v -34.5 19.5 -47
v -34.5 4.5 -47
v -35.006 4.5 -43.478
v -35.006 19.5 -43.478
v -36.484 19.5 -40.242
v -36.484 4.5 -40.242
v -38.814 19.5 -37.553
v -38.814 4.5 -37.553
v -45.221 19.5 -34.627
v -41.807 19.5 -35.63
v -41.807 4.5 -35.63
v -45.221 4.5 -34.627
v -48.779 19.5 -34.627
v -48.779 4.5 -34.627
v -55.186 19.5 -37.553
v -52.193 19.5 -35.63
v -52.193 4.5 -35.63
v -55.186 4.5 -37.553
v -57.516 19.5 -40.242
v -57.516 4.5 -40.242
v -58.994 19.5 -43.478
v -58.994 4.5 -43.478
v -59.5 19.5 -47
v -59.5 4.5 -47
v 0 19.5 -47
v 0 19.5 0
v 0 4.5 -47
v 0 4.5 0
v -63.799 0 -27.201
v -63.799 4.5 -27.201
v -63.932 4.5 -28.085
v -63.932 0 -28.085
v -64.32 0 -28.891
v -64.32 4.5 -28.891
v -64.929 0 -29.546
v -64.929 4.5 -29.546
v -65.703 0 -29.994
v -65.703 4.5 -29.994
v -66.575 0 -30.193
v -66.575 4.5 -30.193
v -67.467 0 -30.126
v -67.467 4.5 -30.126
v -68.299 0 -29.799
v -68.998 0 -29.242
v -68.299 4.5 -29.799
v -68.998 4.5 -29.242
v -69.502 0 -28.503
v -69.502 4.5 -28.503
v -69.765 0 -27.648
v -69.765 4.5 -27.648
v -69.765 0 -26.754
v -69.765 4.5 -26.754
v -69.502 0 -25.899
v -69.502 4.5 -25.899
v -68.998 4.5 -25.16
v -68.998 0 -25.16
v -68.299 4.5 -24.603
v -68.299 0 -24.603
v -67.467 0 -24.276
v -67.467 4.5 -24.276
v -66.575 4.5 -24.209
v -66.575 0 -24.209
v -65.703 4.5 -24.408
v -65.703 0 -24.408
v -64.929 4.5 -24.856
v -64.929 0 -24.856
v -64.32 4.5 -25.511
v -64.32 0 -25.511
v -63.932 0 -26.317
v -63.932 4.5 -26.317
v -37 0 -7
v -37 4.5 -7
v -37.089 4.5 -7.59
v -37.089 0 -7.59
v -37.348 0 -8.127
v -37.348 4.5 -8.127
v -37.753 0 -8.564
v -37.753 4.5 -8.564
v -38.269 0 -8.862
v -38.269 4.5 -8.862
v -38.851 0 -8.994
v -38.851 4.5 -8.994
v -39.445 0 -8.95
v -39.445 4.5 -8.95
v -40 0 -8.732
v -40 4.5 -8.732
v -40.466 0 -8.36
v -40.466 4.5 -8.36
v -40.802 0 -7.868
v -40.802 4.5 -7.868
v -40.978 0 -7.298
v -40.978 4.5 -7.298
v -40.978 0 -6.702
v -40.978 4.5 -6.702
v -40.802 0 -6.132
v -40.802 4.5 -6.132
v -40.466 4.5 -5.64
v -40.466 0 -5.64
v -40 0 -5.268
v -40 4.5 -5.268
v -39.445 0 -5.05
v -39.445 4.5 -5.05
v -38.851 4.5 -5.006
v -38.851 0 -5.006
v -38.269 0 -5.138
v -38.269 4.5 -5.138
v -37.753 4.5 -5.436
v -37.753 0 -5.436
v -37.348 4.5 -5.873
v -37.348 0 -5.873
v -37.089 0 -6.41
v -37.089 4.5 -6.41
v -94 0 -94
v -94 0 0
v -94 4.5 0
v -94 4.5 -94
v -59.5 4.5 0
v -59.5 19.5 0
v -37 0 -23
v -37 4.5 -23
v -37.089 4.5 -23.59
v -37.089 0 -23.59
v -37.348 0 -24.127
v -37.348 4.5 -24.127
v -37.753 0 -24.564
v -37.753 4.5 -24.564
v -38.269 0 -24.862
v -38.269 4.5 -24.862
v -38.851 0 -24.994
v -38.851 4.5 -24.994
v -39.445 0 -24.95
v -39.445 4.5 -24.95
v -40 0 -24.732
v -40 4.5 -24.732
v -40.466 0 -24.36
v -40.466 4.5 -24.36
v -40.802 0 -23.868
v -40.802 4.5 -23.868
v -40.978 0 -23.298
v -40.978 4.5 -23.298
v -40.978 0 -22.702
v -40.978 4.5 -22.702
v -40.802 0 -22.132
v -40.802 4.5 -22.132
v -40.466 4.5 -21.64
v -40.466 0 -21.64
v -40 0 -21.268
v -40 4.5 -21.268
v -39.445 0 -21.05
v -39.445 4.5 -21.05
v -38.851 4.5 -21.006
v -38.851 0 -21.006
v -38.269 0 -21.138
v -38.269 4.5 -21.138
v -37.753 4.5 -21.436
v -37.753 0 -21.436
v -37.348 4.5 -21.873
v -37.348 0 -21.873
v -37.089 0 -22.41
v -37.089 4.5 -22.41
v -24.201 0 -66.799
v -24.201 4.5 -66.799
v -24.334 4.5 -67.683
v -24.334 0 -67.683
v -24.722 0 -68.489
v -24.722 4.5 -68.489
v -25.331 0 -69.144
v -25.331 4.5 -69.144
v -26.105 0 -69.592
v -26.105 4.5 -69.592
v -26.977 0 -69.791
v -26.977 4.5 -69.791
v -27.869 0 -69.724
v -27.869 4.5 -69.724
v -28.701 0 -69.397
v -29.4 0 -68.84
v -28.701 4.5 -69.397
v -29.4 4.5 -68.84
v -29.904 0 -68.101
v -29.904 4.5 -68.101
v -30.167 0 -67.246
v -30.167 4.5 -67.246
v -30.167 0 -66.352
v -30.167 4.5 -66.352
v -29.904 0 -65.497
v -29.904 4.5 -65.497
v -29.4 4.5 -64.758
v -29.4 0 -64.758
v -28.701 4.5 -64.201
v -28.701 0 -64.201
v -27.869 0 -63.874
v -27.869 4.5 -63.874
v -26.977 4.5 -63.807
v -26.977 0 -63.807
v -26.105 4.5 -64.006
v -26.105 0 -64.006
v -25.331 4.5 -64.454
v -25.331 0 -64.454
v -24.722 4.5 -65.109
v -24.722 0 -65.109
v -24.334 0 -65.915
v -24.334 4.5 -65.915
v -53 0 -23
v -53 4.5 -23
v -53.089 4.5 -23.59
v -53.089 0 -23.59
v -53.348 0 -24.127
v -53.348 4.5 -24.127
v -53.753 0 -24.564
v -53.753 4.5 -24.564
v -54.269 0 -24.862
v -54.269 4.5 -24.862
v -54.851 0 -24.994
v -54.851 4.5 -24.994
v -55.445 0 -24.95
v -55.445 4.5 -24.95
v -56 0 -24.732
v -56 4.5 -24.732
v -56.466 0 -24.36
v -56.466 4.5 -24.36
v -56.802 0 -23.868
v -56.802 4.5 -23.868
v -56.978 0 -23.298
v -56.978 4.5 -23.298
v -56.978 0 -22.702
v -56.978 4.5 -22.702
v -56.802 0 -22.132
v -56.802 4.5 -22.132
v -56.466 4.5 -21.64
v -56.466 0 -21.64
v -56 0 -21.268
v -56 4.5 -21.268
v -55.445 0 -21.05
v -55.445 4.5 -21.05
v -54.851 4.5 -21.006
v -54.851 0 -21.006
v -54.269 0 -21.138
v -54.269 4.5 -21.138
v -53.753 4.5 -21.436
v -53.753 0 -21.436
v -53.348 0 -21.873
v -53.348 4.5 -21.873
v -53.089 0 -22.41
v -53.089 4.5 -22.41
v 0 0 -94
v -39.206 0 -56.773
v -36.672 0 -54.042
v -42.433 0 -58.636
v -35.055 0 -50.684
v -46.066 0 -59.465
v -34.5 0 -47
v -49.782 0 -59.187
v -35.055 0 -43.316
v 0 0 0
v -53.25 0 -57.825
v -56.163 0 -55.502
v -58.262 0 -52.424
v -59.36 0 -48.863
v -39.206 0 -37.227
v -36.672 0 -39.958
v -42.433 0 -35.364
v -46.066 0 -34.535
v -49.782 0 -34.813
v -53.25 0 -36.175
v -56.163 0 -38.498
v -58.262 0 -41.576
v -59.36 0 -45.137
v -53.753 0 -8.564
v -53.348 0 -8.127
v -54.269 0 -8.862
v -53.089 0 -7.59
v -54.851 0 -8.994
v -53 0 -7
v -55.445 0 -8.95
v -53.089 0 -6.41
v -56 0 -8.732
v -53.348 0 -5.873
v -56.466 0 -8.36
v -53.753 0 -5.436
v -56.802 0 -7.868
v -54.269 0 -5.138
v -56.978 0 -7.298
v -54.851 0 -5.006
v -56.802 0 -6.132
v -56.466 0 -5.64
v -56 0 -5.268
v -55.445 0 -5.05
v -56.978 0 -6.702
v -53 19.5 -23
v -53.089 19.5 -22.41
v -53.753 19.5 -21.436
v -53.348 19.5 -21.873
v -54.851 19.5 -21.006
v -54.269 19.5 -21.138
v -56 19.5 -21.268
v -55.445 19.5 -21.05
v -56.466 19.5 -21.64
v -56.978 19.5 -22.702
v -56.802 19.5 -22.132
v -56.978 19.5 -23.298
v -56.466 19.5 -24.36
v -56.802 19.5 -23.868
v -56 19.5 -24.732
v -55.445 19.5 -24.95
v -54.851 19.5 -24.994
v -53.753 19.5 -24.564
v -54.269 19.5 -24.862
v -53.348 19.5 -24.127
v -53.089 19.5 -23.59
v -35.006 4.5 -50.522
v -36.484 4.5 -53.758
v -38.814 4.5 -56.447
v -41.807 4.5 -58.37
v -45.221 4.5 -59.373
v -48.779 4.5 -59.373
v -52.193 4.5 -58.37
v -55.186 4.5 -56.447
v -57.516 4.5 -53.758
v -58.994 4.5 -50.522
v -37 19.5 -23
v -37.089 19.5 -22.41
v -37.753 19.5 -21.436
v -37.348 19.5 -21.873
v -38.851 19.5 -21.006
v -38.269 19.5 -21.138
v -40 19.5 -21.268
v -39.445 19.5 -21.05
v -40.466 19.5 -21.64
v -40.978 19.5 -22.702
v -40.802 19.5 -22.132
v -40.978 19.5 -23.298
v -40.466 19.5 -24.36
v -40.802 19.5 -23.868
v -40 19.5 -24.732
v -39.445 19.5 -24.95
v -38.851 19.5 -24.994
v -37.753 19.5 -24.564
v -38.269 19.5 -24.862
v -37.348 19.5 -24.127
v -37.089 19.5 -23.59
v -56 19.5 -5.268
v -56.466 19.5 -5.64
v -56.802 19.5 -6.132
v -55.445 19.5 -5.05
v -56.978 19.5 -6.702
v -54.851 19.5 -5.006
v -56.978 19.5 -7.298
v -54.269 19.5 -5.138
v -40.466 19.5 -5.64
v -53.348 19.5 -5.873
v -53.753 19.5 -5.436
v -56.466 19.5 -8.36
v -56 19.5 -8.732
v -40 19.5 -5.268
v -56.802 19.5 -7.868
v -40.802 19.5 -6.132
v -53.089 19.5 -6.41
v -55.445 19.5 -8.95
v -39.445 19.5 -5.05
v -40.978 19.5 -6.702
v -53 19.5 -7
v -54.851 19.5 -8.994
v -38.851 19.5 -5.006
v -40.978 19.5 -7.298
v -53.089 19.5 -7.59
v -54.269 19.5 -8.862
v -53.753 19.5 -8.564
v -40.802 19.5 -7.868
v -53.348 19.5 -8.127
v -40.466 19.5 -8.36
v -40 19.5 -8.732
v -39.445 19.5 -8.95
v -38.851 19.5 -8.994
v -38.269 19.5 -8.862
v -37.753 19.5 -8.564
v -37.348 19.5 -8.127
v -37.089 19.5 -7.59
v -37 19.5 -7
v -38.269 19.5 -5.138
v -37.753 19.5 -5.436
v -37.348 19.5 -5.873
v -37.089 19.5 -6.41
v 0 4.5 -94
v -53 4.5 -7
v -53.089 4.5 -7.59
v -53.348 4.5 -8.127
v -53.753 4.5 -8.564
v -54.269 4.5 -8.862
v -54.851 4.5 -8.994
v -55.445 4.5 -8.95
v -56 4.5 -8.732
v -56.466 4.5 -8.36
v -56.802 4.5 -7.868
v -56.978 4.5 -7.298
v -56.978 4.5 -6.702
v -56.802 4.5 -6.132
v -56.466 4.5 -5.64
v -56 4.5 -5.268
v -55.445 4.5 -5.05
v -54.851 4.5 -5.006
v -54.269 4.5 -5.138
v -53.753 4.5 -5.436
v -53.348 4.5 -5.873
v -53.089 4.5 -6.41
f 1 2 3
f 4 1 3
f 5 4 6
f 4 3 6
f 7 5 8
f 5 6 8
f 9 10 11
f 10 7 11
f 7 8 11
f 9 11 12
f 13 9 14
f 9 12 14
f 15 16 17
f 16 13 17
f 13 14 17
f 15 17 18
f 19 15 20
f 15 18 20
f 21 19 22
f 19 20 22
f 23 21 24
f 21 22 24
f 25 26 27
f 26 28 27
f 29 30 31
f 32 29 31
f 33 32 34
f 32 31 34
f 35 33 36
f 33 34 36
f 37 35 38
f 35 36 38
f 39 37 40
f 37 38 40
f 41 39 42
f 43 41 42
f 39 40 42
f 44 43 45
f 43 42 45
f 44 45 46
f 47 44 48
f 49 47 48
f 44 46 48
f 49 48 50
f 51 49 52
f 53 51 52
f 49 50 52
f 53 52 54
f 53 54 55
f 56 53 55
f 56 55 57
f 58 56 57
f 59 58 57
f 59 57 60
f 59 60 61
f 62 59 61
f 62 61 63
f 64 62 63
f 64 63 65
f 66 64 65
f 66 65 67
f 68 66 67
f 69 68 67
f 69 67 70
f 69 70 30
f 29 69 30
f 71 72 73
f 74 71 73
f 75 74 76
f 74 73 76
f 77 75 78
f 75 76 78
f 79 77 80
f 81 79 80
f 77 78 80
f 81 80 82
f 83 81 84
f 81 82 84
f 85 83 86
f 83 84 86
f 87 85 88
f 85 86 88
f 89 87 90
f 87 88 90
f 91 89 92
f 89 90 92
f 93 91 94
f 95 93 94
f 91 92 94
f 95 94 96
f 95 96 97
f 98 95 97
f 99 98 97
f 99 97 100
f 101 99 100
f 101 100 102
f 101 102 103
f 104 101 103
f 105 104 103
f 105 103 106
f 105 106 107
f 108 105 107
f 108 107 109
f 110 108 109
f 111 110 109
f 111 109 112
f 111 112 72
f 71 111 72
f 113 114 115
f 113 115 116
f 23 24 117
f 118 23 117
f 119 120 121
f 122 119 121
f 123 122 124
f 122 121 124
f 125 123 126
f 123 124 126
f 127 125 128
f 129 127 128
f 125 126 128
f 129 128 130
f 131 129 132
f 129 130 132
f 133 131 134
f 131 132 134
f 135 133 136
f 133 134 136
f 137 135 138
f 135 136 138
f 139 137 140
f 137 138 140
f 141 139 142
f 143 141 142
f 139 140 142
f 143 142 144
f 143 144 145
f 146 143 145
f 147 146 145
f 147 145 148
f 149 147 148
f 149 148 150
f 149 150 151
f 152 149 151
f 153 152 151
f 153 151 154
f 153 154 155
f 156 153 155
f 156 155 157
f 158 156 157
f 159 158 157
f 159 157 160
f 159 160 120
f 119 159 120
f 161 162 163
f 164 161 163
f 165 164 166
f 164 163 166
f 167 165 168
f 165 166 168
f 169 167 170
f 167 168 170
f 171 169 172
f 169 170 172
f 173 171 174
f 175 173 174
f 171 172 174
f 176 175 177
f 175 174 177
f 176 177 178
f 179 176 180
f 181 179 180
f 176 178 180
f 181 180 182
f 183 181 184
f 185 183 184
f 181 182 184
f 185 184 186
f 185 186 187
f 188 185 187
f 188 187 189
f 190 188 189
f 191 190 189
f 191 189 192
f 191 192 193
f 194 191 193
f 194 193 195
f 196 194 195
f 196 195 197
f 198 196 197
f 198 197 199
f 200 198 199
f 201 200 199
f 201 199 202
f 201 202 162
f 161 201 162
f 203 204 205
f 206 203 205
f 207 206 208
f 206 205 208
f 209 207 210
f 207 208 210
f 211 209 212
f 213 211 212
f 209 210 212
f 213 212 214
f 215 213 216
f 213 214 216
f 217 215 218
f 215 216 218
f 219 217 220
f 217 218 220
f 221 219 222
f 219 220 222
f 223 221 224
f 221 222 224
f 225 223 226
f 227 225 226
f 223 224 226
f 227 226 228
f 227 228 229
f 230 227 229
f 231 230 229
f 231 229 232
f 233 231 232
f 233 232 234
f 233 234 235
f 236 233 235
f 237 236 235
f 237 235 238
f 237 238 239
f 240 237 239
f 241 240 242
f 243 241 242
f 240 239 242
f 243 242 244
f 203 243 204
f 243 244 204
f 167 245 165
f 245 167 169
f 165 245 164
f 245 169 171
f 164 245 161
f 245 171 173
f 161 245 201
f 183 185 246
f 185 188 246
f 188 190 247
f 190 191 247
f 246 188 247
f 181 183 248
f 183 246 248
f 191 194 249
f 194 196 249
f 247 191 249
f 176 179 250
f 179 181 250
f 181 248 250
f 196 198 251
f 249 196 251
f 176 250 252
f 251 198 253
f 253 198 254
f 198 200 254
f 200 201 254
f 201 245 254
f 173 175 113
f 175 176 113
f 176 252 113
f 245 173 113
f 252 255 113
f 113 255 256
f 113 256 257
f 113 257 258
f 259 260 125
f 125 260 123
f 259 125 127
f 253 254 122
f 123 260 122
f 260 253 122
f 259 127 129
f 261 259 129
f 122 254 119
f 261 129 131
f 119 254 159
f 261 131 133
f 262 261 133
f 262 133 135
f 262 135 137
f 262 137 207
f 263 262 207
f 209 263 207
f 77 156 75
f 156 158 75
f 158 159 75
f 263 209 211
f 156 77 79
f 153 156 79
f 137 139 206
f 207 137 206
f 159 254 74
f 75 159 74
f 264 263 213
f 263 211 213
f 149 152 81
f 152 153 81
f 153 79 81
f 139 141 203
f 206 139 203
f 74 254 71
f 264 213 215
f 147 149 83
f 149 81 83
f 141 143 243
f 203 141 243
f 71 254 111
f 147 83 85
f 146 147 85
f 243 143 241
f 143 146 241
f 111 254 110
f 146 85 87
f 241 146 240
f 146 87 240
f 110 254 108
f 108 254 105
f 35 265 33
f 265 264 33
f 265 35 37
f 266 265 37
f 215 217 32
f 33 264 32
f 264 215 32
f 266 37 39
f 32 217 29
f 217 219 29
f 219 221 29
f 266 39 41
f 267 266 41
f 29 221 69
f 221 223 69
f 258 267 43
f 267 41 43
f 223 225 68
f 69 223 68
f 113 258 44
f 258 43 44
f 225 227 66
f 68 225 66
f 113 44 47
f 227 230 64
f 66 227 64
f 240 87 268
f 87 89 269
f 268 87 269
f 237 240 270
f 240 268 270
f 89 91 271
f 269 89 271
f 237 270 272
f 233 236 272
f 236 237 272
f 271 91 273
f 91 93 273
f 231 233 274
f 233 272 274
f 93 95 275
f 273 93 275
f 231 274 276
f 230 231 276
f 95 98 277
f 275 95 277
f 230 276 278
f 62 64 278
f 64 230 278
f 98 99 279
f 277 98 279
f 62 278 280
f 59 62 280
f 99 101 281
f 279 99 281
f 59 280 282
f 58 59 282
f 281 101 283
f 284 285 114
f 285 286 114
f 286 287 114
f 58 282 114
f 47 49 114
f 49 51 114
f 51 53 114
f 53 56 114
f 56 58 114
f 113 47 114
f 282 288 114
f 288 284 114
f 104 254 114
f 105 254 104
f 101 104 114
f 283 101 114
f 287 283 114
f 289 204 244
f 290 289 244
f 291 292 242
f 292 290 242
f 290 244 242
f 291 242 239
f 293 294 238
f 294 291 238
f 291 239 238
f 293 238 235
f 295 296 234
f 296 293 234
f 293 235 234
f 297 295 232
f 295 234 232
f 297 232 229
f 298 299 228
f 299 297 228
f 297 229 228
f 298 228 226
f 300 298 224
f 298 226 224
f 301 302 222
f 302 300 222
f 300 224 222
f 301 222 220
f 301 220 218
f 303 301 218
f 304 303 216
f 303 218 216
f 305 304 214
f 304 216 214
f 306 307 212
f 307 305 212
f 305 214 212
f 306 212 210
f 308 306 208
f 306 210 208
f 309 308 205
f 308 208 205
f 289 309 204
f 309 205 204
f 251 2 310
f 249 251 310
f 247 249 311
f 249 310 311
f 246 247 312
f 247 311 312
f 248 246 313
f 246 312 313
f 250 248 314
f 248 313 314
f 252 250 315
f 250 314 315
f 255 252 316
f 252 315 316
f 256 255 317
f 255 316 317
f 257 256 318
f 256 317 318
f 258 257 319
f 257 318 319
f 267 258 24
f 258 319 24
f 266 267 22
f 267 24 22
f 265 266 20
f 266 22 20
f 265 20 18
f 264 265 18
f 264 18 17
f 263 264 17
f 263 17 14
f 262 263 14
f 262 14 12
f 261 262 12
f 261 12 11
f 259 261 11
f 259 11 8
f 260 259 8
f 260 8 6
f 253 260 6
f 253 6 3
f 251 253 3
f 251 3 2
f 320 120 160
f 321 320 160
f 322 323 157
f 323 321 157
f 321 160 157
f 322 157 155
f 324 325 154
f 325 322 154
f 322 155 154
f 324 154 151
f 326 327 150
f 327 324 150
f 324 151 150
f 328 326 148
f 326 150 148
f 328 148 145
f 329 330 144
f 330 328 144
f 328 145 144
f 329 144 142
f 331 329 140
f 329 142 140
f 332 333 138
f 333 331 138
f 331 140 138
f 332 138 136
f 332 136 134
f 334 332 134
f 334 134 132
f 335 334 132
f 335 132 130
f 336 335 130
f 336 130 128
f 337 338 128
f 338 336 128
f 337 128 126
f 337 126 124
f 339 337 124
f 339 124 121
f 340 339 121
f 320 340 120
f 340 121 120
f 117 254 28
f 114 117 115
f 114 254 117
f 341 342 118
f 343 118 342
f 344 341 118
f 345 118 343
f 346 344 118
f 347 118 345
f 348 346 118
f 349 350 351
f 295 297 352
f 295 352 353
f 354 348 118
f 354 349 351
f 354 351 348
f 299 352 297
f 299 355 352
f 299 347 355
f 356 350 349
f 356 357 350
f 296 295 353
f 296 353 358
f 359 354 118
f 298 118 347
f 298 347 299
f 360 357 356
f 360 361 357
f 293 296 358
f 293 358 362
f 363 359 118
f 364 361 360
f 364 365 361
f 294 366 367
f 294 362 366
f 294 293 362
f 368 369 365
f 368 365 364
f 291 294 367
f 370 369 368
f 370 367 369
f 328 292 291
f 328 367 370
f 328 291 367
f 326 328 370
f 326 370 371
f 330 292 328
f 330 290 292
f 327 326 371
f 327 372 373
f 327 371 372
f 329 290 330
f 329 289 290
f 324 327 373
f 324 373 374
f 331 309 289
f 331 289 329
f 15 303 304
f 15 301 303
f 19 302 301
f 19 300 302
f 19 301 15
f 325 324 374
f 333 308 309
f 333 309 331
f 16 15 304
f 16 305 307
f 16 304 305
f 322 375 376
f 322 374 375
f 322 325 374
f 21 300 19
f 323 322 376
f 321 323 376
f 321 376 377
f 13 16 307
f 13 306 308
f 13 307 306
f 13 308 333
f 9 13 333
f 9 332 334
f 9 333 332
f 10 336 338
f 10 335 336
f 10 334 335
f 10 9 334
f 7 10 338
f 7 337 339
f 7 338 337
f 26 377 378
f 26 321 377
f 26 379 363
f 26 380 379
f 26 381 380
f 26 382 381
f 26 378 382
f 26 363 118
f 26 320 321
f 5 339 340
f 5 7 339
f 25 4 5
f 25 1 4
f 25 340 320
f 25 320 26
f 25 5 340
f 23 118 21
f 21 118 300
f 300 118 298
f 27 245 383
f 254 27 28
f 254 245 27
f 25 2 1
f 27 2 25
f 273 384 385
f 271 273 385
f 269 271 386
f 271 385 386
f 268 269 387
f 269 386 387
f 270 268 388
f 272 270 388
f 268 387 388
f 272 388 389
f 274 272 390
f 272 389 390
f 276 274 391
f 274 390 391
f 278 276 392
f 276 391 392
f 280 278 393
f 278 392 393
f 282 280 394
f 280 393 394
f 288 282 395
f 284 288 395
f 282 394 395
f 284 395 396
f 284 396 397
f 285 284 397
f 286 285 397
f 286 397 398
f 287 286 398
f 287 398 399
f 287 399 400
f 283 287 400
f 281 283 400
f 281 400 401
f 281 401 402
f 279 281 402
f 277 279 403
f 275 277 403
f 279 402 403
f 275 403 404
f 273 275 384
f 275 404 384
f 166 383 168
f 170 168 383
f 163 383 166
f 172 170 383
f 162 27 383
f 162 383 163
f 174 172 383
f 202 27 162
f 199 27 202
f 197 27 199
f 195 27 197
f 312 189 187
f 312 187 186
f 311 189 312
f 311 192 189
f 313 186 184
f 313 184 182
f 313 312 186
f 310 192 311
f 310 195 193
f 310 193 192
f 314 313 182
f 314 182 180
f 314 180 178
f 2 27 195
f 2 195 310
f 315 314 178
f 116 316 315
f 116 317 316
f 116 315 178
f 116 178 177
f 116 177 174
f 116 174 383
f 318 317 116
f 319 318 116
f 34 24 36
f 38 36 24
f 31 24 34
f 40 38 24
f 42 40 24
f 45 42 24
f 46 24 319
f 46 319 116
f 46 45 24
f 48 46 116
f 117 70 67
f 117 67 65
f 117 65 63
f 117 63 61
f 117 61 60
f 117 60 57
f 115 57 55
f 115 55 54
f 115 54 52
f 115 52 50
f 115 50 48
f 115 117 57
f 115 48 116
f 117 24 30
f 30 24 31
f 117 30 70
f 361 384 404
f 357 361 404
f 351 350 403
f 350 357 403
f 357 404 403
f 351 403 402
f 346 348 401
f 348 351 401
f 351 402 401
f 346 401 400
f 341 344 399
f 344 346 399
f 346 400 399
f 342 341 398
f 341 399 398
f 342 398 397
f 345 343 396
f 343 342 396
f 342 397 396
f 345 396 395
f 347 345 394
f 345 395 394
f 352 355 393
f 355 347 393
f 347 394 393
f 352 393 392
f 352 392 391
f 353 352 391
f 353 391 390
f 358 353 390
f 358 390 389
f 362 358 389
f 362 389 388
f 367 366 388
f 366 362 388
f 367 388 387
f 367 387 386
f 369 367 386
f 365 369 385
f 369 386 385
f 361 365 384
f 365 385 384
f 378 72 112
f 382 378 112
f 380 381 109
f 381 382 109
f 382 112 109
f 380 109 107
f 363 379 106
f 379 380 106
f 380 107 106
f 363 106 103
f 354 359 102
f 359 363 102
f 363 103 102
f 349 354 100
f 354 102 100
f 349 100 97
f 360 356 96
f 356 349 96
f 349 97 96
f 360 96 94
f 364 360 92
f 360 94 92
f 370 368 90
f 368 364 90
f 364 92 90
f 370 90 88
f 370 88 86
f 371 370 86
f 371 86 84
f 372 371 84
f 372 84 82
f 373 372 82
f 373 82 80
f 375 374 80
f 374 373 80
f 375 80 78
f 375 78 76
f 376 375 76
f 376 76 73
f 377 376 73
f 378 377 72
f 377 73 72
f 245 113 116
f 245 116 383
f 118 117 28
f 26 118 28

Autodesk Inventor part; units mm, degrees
ref_plane "YZ Plane" through (0, 0, 0) normal (1, 0, 0) x (0, 1, 0)
sketch "Sketch1" plane through (0, 0, 0) normal (0, 1, 0) x (-1, 0, 0)
  line L0 (0, 0) -> (94, 0)
  line L1 (94, 0) -> (94, -94)
  line L2 (94, -94) -> (0, -94)
  line L3 (0, -94) -> (0, 0)
  dimension "d0" = 94
  dimension "d1" = 94
extrude "Extrusion1" add sketch "Sketch1" along normal blind 4.5
sketch "Sketch2" plane through (0, 4.5, 0) normal (0, 1, 0) x (1, 0, 0)
  circle A0 centre (-47, 47) radius 12.5
  point P0 (0, 0)
  dimension "d4" = 25
  dimension "d5" = 47
  dimension "d6" = 47
extrude "Extrusion2" cut sketch "Sketch2" against normal blind 4.5
ref_plane "Work Plane3" through (-54.5, 0, 0) normal (1, 0, 0) x (0, 0, -1)
sketch "Sketch4" plane through (0, 4.5, 0) normal (0, 1, 0) x (1, 0, 0)
  line L0 (0, 94) -> (-94, 94) projected
  line L1 (-94, 94) -> (-94, 0) projected
  line L2 (0, 94) -> (-94, 0)
  circle A0 centre (-27.201, 66.799) radius 3
  line L3 (-94, 94) -> (0, 0)
  circle A1 centre (-66.799, 27.201) radius 3
  circle A2 centre (-55, 23) radius 2
  circle A3 centre (-39, 23) radius 2
  circle A4 centre (-55, 7) radius 2
  circle A5 centre (-39, 7) radius 2
  line L4 (-94, 0) -> (0, 0) projected
  line L5 (-47, 94) -> (-47, 0)
  line L6 (0, 0) -> (0, 94) projected
  circle A6 centre (-47, 47) radius 12.5 projected
  point P0 (-47, 47)
  dimension "d21" = 6
  dimension "d25" = 4
  dimension "d26" = 4
  dimension "d27" = 4
  dimension "d28" = 4
  dimension "d29" = 16
  dimension "d30" = 16
  dimension "d31" = 16
  dimension "d32" = 16
  dimension "d33" = 7
  dimension "d34" = 39
  dimension "d35" = 7
  dimension "d36" = 39
  dimension "d66" = 28
extrude "Extrusion4" cut sketch "Sketch4" against normal blind 10 contours A0 L2 | L2 A0 | A1 L2 | L2 A1
extrude "Extrusion5" cut sketch "Sketch4" against normal blind 10 contours A2 | A3 | A4 | A5
sketch "Sketch5" plane through (0, 4.5, 0) normal (0, 1, 0) x (1, 0, 0)
  circle A0 centre (-47, 47) radius 12.5 projected
  line L0 (-59.5, 47) -> (-59.5, 0)
  line L1 (-59.5, 47) -> (0, 47)
  line L2 (0, 0) -> (0, 94) projected
  circle A1 centre (-47, 47) radius 12.5
  line L3 (-94, 0) -> (0, 0) projected
  line L4 (-59.5, 0) -> (0, 0)
  line L5 (0, 0) -> (0, 47)
  circle A2 centre (-55, 7) radius 2 projected
  circle A3 centre (-55, 7) radius 2
  circle A4 centre (-55, 23) radius 2 projected
  circle A5 centre (-55, 23) radius 2
  circle A6 centre (-39, 23) radius 2 projected
  circle A7 centre (-39, 23) radius 2
  circle A8 centre (-39, 7) radius 2 projected
  circle A9 centre (-39, 7) radius 2
  point P0 (-34.5, 47)
extrude "Extrusion6" add sketch "Sketch5" along normal blind 15 contours L1 L2 L3 L0 A0
ref_plane "Work Plane5" through (-94, 0, 0) normal (-0.7071, 0, -0.7071) x (0, 1, 0)
ref_plane "Work Plane6" through (0, -10, 0) normal (0, -1, 0) x (1, 0, 0)
properties part number "box cover" material "Wood (Birch)"
